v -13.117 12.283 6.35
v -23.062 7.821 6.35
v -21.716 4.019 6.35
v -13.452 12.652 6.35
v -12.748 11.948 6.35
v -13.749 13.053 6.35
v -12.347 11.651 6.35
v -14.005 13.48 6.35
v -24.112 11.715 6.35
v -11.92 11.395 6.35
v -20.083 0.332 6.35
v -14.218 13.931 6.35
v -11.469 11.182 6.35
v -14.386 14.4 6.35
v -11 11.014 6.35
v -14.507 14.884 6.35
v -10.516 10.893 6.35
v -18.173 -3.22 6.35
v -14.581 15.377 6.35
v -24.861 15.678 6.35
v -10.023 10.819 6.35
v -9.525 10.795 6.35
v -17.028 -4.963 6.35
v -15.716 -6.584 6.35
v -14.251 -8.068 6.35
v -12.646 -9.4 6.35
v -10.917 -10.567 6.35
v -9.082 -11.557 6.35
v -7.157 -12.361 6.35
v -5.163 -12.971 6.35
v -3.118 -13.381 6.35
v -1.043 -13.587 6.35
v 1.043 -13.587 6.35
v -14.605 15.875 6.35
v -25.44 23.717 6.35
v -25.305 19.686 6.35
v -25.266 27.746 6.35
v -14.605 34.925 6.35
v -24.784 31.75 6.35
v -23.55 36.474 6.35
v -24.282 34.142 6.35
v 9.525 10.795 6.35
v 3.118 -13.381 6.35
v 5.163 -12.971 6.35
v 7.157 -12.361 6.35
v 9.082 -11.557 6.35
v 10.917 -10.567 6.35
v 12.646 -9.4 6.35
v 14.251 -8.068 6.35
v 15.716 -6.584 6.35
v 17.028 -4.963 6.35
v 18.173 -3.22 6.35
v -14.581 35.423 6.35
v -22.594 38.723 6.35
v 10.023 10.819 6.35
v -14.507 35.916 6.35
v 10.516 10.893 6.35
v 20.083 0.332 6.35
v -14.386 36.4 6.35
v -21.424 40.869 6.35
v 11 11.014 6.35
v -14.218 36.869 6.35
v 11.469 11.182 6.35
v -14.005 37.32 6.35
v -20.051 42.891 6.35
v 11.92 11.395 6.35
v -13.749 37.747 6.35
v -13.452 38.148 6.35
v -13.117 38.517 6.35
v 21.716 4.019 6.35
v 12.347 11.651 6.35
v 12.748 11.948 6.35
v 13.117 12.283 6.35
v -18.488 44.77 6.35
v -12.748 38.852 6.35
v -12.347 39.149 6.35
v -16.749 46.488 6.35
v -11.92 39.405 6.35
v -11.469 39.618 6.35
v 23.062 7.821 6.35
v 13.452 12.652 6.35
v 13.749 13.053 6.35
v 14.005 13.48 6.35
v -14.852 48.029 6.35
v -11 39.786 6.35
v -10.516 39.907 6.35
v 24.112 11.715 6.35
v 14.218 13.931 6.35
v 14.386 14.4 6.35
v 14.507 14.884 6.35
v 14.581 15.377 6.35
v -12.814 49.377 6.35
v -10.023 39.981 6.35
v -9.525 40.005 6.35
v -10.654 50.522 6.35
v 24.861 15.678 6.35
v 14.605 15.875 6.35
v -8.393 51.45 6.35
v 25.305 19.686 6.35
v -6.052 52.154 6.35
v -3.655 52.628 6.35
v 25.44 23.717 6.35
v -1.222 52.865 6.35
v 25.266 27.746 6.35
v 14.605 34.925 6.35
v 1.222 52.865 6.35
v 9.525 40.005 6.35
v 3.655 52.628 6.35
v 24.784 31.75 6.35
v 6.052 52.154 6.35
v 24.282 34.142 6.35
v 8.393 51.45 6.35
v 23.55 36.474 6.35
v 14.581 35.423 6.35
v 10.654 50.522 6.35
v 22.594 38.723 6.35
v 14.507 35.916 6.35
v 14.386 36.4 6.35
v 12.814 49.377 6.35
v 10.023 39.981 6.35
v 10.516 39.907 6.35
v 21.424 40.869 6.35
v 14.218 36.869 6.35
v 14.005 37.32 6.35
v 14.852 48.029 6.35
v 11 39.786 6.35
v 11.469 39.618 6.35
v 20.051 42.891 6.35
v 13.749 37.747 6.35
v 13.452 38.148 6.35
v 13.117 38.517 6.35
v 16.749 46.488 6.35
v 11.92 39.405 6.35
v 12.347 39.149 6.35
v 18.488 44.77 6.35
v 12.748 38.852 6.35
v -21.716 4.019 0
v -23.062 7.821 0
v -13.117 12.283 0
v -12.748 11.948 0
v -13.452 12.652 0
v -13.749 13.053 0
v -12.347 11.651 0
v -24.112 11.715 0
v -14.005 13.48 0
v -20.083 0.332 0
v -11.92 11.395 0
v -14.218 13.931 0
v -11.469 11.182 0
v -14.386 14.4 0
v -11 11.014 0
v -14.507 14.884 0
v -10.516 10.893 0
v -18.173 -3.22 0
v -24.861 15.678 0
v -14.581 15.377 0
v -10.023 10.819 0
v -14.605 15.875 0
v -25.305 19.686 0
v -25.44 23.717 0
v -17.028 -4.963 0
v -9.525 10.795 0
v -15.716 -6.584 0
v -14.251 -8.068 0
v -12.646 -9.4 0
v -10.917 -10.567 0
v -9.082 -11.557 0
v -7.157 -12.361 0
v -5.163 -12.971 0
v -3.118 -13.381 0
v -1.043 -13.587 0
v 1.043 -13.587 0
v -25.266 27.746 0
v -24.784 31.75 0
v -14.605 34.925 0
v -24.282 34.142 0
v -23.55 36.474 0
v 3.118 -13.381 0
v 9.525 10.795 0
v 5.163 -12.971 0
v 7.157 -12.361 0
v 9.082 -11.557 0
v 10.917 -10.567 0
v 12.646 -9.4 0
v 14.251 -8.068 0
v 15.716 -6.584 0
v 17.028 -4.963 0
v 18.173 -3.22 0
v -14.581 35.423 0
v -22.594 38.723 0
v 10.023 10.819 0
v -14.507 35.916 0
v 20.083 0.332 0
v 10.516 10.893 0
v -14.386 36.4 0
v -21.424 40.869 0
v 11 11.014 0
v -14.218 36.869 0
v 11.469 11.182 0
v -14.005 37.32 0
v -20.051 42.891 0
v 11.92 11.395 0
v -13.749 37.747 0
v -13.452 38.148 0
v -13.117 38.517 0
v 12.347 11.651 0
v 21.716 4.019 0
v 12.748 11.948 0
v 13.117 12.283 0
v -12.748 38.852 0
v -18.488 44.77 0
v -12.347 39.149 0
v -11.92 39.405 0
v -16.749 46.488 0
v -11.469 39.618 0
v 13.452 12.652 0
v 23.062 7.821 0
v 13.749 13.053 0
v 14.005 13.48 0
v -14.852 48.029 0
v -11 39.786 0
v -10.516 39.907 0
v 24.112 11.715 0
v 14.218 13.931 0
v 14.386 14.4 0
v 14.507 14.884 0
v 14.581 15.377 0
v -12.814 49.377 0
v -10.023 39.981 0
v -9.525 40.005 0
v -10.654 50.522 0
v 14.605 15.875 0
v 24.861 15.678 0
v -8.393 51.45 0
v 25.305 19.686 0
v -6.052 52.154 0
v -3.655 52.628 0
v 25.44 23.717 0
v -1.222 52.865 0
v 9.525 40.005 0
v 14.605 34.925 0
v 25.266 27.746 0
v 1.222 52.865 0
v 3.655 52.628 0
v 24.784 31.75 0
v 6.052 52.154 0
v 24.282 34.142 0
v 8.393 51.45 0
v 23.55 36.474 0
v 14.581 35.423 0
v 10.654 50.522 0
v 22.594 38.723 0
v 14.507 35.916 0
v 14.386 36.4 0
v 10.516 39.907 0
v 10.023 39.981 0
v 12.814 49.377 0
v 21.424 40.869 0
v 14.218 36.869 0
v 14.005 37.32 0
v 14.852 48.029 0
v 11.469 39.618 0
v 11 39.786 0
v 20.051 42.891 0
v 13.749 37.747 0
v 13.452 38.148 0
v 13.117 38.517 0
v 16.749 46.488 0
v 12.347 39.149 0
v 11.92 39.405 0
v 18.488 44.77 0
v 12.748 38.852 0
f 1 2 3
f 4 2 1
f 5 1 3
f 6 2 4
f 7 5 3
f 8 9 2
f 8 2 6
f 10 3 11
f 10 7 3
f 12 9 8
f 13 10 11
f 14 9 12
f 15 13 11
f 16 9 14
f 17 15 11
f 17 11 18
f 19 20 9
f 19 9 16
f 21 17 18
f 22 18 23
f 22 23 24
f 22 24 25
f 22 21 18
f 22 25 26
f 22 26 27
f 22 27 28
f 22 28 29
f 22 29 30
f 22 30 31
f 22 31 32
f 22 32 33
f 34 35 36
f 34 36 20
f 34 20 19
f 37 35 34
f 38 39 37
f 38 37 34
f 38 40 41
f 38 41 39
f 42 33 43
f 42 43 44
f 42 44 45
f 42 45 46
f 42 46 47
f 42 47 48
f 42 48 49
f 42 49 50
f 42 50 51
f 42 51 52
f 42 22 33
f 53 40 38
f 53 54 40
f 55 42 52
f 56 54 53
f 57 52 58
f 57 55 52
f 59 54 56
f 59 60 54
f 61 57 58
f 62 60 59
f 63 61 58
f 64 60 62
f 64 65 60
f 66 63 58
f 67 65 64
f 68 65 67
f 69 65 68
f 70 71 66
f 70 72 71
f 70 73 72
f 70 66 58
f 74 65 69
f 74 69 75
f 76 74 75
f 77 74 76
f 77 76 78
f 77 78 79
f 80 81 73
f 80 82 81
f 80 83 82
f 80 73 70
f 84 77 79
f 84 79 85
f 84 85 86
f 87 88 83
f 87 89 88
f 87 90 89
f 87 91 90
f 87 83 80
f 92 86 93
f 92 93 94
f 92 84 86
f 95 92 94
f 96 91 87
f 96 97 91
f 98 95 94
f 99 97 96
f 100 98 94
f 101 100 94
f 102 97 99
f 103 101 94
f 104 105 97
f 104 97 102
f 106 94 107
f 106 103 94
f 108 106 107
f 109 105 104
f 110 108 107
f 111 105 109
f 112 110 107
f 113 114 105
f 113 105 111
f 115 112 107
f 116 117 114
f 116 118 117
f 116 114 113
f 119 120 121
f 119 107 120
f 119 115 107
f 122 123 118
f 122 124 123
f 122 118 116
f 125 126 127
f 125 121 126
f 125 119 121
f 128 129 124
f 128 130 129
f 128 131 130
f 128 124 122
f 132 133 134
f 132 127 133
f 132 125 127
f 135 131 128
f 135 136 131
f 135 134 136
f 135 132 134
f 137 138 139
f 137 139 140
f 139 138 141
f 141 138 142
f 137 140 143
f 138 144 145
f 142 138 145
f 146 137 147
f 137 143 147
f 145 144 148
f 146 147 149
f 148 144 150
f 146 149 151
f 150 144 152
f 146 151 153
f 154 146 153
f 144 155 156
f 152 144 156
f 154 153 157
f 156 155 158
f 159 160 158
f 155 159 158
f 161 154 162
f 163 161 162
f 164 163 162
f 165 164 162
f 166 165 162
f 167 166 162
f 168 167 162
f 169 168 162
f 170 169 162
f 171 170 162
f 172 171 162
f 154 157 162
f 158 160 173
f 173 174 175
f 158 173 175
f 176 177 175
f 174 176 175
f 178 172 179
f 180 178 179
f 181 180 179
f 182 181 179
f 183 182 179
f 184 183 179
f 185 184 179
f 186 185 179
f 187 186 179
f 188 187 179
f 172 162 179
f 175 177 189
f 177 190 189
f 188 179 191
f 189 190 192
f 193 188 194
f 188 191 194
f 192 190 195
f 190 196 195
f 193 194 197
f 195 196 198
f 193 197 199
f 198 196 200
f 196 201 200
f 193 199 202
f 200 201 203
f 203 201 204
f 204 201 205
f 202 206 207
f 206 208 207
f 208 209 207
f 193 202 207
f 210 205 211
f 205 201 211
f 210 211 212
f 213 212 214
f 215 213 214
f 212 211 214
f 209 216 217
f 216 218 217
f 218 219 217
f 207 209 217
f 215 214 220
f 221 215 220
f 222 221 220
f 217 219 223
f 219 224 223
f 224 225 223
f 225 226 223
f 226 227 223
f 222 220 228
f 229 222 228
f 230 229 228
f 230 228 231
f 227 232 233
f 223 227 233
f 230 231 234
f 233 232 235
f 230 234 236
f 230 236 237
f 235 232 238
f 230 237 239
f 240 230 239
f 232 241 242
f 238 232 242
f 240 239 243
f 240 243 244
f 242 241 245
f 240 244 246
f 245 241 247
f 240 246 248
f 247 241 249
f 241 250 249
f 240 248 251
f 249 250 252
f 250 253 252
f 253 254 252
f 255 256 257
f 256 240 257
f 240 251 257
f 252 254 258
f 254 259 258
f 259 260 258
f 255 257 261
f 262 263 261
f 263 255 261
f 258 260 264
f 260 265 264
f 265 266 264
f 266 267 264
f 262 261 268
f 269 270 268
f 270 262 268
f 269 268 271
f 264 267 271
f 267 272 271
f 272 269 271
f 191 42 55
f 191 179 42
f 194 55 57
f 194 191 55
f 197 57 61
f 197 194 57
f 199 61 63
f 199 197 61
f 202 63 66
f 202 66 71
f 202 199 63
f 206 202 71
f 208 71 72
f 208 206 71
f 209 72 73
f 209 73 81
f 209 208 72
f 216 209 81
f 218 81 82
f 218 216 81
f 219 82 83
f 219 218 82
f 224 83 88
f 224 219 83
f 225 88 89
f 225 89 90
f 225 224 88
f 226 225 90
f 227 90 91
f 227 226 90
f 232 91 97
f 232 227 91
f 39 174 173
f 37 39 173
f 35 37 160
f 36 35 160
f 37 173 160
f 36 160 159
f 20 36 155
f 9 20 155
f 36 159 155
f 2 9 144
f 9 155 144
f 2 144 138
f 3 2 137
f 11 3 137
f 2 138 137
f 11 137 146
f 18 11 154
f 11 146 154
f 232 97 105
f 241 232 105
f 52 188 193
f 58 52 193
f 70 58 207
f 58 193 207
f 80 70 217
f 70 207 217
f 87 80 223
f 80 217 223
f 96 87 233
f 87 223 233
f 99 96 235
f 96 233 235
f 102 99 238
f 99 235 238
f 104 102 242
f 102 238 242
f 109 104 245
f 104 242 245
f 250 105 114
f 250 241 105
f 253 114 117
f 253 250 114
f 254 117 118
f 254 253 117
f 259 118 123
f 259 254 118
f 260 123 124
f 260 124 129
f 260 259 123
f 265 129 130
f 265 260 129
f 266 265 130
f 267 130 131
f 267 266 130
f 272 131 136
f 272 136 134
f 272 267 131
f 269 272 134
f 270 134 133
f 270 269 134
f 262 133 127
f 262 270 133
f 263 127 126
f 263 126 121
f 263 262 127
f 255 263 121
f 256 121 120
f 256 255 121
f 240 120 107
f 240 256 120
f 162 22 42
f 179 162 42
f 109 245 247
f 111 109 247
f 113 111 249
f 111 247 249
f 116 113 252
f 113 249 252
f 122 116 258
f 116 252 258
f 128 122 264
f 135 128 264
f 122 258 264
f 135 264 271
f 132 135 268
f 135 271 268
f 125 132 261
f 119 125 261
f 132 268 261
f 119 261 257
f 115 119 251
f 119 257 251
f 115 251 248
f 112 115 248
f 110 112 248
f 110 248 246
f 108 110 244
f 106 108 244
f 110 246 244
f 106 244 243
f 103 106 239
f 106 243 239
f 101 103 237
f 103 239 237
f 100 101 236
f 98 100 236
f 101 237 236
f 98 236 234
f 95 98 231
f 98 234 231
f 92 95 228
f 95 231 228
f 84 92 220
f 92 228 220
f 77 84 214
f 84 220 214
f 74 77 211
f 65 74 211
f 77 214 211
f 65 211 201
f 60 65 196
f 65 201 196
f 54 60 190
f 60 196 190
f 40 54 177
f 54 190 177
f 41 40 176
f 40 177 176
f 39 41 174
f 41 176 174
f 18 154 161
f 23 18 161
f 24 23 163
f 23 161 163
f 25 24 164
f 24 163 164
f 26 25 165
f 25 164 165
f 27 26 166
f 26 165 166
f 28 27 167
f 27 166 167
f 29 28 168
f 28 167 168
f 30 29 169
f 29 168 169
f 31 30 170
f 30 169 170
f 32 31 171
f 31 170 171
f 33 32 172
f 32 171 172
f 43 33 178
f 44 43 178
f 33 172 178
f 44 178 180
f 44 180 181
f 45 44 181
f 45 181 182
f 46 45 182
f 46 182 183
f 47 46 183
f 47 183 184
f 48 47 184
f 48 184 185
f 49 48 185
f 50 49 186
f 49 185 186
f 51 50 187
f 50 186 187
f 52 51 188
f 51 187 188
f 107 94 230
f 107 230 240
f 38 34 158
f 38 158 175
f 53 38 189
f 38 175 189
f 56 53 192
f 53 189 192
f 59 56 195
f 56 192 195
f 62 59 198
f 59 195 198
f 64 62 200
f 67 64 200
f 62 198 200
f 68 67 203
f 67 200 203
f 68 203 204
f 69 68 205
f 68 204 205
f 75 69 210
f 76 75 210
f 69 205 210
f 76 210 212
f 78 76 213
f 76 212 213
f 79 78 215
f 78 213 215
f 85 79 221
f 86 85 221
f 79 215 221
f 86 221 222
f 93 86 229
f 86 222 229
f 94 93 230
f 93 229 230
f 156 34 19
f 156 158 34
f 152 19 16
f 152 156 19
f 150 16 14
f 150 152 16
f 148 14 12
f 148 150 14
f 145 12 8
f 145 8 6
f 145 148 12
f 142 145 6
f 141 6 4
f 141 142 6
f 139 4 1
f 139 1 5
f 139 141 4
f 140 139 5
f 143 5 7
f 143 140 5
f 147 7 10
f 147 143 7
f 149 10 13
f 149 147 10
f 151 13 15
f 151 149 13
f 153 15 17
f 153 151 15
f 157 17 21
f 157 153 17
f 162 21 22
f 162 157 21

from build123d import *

# Parameters (mm, degrees)
BOSS_EXTRUDE1_DEPTH = 6.35
CUT_EXTRUDE1_REACH  = 8.35
SKETCH2_W           = 29.21
SKETCH2_H           = 29.21
FILLET1_R           = 5.08


with BuildPart() as part:
    # Sketch1 → Boss-Extrude1 (new body)
    with BuildSketch(Plane.XY):
        with BuildLine():
            ThreePointArc((-24.784009304, 31.75), (-24.524700471, 13.689081607), (-18.172986801, -3.220080042))
            ThreePointArc((-18.172986801, -3.220080042), (0, -13.612941591), (18.172986801, -3.220080042))
            ThreePointArc((18.172986801, -3.220080042), (24.524700471, 13.689081607), (24.784009304, 31.75))
            ThreePointArc((24.784009304, 31.75), (0, 52.895043223), (-24.784009304, 31.75))
        make_face()
    extrude(amount=BOSS_EXTRUDE1_DEPTH)

    # Sketch2 → Cut-Extrude1 (cut, up to next)
    with BuildSketch(Plane.XY.offset(6.35), mode=Mode.PRIVATE) as cut_extrude1_sk1:
        with Locations((0, 25.4)):
            Rectangle(SKETCH2_W, SKETCH2_H)
    cut_extrude1_tool1 = extrude(cut_extrude1_sk1.sketch, amount=-CUT_EXTRUDE1_REACH, mode=Mode.PRIVATE) & part.part
    add(cut_extrude1_tool1.solids().sort_by_distance((0, 25.4, 6.35))[0], mode=Mode.SUBTRACT)

    # Fillet1
    fillet1_edges = [part.edges().sort_by_distance(p)[0] for p in [
        (14.605, 40.005, 3.175),
        (14.605, 10.795, 3.175),
        (-14.605, 10.795, 3.175),
        (-14.605, 40.005, 3.175),
    ]]
    fillet(fillet1_edges, radius=FILLET1_R)


solid = part.part
